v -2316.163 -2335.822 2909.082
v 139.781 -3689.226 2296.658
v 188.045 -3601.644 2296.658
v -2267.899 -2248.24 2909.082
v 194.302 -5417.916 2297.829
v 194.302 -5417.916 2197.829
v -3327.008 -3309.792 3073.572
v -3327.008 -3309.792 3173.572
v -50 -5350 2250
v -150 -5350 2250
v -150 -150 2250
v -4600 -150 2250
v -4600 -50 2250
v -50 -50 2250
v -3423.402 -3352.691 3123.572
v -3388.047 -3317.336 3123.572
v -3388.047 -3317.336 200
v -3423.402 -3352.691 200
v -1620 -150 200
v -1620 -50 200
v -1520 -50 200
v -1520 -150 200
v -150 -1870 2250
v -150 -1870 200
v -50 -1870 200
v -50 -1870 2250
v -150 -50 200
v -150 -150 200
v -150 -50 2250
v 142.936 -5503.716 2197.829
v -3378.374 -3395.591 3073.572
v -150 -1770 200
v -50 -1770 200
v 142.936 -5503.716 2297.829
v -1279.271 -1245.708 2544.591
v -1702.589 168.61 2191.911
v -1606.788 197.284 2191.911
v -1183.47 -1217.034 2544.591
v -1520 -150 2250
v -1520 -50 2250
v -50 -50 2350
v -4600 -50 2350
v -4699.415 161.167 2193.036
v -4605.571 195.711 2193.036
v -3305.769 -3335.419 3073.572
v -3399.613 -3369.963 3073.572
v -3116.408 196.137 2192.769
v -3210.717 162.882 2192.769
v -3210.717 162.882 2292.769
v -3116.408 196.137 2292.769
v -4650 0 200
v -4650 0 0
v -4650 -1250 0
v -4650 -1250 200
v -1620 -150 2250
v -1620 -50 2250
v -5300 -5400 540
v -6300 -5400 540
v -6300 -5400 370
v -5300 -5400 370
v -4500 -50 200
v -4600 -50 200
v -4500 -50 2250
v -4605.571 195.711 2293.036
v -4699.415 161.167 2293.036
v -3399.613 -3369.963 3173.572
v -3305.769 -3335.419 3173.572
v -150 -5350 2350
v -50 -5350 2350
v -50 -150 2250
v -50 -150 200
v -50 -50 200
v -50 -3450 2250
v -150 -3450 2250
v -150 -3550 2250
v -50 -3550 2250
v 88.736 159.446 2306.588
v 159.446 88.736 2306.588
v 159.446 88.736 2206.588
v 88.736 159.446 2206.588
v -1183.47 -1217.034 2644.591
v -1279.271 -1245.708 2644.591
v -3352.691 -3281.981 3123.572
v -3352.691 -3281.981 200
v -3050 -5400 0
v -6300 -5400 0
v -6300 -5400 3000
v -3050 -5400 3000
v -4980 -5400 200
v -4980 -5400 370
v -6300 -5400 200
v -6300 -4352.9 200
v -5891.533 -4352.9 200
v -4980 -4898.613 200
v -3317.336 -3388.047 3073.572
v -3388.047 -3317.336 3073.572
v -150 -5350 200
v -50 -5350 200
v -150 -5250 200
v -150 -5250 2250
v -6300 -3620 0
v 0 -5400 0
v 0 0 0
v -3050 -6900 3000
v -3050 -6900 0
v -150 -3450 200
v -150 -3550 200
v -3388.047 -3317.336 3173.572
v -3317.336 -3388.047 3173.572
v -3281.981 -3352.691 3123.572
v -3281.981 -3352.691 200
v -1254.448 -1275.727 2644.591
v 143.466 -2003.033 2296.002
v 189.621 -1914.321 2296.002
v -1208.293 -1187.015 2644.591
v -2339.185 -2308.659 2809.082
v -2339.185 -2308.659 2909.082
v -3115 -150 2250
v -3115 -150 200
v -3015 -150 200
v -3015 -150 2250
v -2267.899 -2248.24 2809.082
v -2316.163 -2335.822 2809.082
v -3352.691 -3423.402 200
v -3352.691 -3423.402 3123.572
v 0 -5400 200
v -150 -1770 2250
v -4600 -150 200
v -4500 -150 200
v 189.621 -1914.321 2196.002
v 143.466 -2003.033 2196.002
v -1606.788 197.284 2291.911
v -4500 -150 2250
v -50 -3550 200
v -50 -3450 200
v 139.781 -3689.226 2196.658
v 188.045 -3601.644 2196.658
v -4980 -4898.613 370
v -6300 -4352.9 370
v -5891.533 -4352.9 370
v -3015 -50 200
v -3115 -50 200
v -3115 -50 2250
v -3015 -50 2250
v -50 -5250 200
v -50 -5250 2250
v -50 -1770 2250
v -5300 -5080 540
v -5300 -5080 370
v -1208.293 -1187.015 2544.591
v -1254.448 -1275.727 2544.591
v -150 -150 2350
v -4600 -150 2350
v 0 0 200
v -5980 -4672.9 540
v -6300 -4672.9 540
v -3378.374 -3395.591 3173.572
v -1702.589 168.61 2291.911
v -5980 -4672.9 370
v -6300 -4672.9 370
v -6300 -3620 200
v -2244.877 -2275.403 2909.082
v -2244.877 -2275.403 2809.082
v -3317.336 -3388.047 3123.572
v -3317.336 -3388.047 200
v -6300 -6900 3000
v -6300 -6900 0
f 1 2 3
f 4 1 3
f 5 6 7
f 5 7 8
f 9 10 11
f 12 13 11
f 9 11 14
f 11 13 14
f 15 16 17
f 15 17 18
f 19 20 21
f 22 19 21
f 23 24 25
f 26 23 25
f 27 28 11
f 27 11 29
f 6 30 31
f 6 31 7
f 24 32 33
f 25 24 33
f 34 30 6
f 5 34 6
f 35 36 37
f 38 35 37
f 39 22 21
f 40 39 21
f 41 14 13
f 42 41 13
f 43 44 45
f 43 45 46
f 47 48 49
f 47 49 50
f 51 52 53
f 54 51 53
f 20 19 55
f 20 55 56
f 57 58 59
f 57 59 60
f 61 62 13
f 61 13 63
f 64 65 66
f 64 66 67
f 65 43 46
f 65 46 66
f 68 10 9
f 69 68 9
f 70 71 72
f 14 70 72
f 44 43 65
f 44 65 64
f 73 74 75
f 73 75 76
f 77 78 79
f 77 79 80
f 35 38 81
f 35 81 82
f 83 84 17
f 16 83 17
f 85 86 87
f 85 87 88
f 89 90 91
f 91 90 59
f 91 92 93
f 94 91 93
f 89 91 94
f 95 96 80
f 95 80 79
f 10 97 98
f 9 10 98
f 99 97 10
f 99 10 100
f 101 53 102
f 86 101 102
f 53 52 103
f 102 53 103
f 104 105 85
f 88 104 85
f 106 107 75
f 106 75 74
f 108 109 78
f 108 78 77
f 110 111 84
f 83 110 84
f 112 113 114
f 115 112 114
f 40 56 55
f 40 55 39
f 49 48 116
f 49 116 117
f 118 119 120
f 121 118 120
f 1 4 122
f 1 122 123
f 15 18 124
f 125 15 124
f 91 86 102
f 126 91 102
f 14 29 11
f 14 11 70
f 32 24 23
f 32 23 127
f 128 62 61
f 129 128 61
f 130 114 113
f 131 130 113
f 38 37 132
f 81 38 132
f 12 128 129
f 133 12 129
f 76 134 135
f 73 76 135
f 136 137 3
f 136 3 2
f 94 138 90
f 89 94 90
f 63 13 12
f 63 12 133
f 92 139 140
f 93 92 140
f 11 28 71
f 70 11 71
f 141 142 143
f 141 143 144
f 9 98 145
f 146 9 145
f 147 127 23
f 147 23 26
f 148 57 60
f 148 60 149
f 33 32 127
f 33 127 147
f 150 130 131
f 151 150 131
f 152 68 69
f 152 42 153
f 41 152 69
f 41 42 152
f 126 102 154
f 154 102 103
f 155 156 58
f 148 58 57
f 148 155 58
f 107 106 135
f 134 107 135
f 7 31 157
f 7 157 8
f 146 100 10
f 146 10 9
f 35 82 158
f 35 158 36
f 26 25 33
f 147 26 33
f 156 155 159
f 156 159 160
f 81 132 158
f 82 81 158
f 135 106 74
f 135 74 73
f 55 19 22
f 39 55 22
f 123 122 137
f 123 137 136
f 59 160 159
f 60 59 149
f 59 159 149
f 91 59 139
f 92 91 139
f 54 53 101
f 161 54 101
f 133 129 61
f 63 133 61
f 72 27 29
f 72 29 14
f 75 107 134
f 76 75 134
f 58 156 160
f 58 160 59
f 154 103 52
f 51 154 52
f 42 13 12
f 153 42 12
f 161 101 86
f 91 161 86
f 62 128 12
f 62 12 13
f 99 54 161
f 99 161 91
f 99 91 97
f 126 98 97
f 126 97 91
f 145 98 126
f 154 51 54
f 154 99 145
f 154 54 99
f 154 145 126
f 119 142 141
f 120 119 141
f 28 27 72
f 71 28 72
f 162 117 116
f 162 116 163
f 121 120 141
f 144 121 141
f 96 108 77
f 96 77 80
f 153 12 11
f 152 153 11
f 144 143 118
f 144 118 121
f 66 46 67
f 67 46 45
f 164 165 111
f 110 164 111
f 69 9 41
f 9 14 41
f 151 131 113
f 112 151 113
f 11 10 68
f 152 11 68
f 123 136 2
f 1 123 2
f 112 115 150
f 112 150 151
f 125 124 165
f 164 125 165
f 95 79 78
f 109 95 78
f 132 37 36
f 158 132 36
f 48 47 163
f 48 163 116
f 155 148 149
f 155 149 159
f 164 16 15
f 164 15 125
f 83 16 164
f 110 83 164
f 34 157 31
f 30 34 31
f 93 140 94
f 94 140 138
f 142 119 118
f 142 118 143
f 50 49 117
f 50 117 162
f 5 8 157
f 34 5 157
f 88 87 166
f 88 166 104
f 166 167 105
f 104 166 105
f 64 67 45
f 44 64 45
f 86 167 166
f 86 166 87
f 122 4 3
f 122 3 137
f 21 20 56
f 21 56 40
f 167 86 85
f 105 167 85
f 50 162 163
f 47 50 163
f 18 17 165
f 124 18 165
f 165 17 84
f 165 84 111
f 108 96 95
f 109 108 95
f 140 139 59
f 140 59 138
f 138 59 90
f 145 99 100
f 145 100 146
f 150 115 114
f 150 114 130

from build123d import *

# Parameters (mm, degrees)
F1_DEPTH  = 200
F2_W      = 100
F2_H      = 100
F3_DEPTH  = 2050
F5_DEPTH  = 100
F8_W      = 100
F8_H      = 100
F9_DEPTH  = 2050
F10_DEPTH = 1800
F14_W     = 100
F14_H     = 100
F19_W     = 100
F19_H     = 100
F24_W     = 100
F24_H     = 100
F29_W     = 100
F29_H     = 100
F34_W     = 100
F34_H     = 100
F39_W     = 100
F39_H     = 100
F44_W     = 100
F44_H     = 100
F47_DEPTH = 2923.5723116355
F6_W      = 3250
F6_H      = 1500
F48_DEPTH = 3000
F51_DEPTH = 170
F53_DEPTH = 170


with BuildPart() as f1:
    # F0 (on Top) → F1 (new body)
    with BuildSketch(Plane.XY):
        Polygon((0, -5400), (0, 0), (-4650, 0), (-4650, -1250), (-6300, -3620), (-6300, -5400), align=None)
    extrude(amount=F1_DEPTH)

    # F8 (on face) → F9 (join)
    with BuildSketch(Plane.XY.offset(200)):
        with Locations((-100, -5300)):
            Rectangle(F8_W, F8_H)
    extrude(amount=F9_DEPTH)


with BuildPart() as f3:
    # F2 (on face) → F3 (new body)
    with BuildSketch(Plane.XY.offset(200)):
        with Locations((-100, -100)):
            Rectangle(F2_W, F2_H)
    extrude(amount=F3_DEPTH)


with BuildPart() as f3b:
    # F2 (on face) → F3, piece 2 (new body)
    with BuildSketch(Plane.XY.offset(200)):
        with Locations((-100, -1820)):
            Rectangle(F2_W, F2_H)
    extrude(amount=F3_DEPTH)


with BuildPart() as f3c:
    # F2 (on face) → F3, piece 3 (new body)
    with BuildSketch(Plane.XY.offset(200)):
        with Locations((-100, -3500)):
            Rectangle(F2_W, F2_H)
    extrude(amount=F3_DEPTH)


with BuildPart() as f3d:
    # F2 (on face) → F3, piece 4 (new body)
    with BuildSketch(Plane.XY.offset(200)):
        with Locations((-1570, -100)):
            Rectangle(F2_W, F2_H)
    extrude(amount=F3_DEPTH)


with BuildPart() as f3e:
    # F2 (on face) → F3, piece 5 (new body)
    with BuildSketch(Plane.XY.offset(200)):
        with Locations((-4550, -100)):
            Rectangle(F2_W, F2_H)
    extrude(amount=F3_DEPTH)


with BuildPart() as f3f:
    # F2 (on face) → F3, piece 6 (new body)
    with BuildSketch(Plane.XY.offset(200)):
        with Locations((-3065, -100)):
            Rectangle(F2_W, F2_H)
    extrude(amount=F3_DEPTH)


with BuildPart() as f5:
    # F4 (on face) → F5 (new body)
    with BuildSketch(Plane.XY.offset(2250)):
        Polygon((-150, -50), (-4600, -50), (-4600, -150), (-150, -150), (-50, -50), align=None)
        Polygon((-50, -150), (-50, -50), (-150, -150), (-150, -3550), (-50, -3550), align=None)
    extrude(amount=F5_DEPTH)

    # F10 (add, through all): a face of the model
    f10_faces = [f5.faces().sort_by_distance(p)[0] for p in [
        (-100, -3550, 2300),
    ]]
    extrude(f10_faces, amount=F10_DEPTH)


with BuildPart() as f15:
    # F15: sweep along a path in F12
    with BuildLine(Plane(origin=(0, 0, 0), x_dir=(-0.7071067812, -0.7071067812, 0), z_dir=(-0.7071067812, 0.7071067812, 0))) as f15_path:
        Line((4741.4213562373, 3123.5723116355), (-175.4912601344, 2256.5879555833))
    # F14 (on face) → F15 (sweep)
    with BuildSketch(Plane(origin=(-3352.6911934581, -3352.6911934581, 0), x_dir=(0.7071067812, -0.7071067812, 0), z_dir=(-0.7071067812, -0.7071067812, 0))):
        with Locations((0, 3123.5723116355)):
            Rectangle(F14_W, F14_H)
    sweep(path=f15_path.line)


with BuildPart() as f20:
    # F20: sweep along a path in F17
    with BuildLine(Plane(origin=(-2362.1864095052, -3945.6828345314, 0), x_dir=(0.8579936122, -0.5136603562, 0), z_dir=(-0.5136603562, -0.8579936122, 0))) as f20_path:
        Line((-1154.4430750004, 3123.5723116355), (2949.6790376872, 2247.8291507744))
    # F19 (on face) → F20 (sweep)
    with BuildSketch(Plane(origin=(-990.5047839529, 592.9916410733, 0), x_dir=(0.5136603562, 0.8579936122, 0), z_dir=(0.8579936122, -0.5136603562, 0))):
        with Locations((-4598.7321800652, 3123.5723116355)):
            Rectangle(F19_W, F19_H)
    sweep(path=f20_path.line)


with BuildPart() as f25:
    # F25: sweep along a path in F22
    with BuildLine(Plane(origin=(-1502.7624460571, -2726.9755756037, 0), x_dir=(0.8758188091, -0.4826400455, 0), z_dir=(-0.4826400455, -0.8758188091, 0))) as f25_path:
        Line((-901.1779233051, 2859.0818405728), (1902.9906666078, 2246.6579034372))
    # F24 (on face) → F25 (sweep)
    with BuildSketch(Plane(origin=(-789.2685756212, 434.9445539254, 0), x_dir=(-0.4826400455, -0.8758188091, 0), z_dir=(-0.8758188091, 0.4826400455, 0))):
        with Locations((3113.6298365764, 2859.0818405728)):
            Rectangle(F24_W, F24_H)
    sweep(path=f25_path.line)


with BuildPart() as f30:
    # F30: sweep along a path in F27
    with BuildLine(Plane(origin=(-766.4947975737, -1473.2363669454, 0), x_dir=(0.8871152605, -0.4615479548, 0), z_dir=(-0.4615479548, -0.8871152605, 0))) as f30_path:
        Line((-524.03117499, 2594.5913695101), (1051.7669505735, 2246.0017914729))
    # F29 (on face) → F30 (sweep)
    with BuildSketch(Plane(origin=(-464.8760523248, 241.8655170469, 0), x_dir=(-0.4615479548, -0.8871152605, 0), z_dir=(-0.8871152605, 0.4615479548, 0))):
        with Locations((1660.7045696324, 2594.5913695101)):
            Rectangle(F29_W, F29_H)
    sweep(path=f30_path.line)


with BuildPart() as f35:
    # F35: sweep along a path in F32
    with BuildLine(Plane(origin=(-1468.3846024822, -439.5003017846, 0), x_dir=(-0.2867402487, 0.9580083662, 0), z_dir=(0.9580083662, 0.2867402487, 0))) as f35_path:
        Line((-826.579992429, 2594.5913695101), (649.7307515053, 2241.9113541709))
    # F34 (on face) → F35 (sweep)
    with BuildSketch(Plane(origin=(237.0137525837, -791.8705481139, 0), x_dir=(0.9580083662, 0.2867402487, 0), z_dir=(0.2867402487, -0.9580083662, 0))):
        with Locations((-1532.7471598654, 2594.5913695101)):
            Rectangle(F34_W, F34_H)
    sweep(path=f35_path.line)


with BuildPart() as f40:
    # F40: sweep along a path in F37
    with BuildLine(Plane(origin=(-2757.3927763263, -972.3307088586, 0), x_dir=(0.3325564986, -0.9430833342, 0), z_dir=(-0.9430833342, -0.3325564986, 0))) as f40_path:
        Line((1399.346446862, 2859.0818405728), (-1221.3558871335, 2242.7685480654))
    # F39 (on face) → F40 (sweep)
    with BuildSketch(Plane(origin=(465.361754648, -1319.7003128197, 0), x_dir=(-0.9430833342, -0.3325564986, 0), z_dir=(-0.3325564986, 0.9430833342, 0))):
        with Locations((2923.806069206, 2859.0818405728)):
            Rectangle(F39_W, F39_H)
    sweep(path=f40_path.line)


with BuildPart() as f45:
    # F45: sweep along a path in F42
    with BuildLine(Plane(origin=(-4039.4766020219, -1486.9228653332, 0), x_dir=(-0.3454383305, 0.9384414525, 0), z_dir=(0.9384414525, 0.3454383305, 0))) as f45_path:
        Line((-1988.1563448709, 3123.5723116355), (1774.6037001363, 2243.0355831929))
    # F44 (on face) → F45 (sweep)
    with BuildSketch(Plane(origin=(686.7854085638, -1865.768328125, 0), x_dir=(-0.9384414525, -0.3454383305, 0), z_dir=(-0.3454383305, 0.9384414525, 0))):
        with Locations((4304.4524420341, 3123.5723116355)):
            Rectangle(F44_W, F44_H)
    sweep(path=f45_path.line)


with BuildPart() as f47:
    # F46 (on face) → F47 (new body, through all)
    with BuildSketch(Plane.XY.offset(200)):
        Polygon((-3352.6911934581, -3281.9805153395), (-3388.0465325174, -3317.3358543988), (-3317.3358543988, -3388.0465325174), (-3281.9805153395, -3352.6911934581), align=None)
        Polygon((-3317.3358543988, -3388.0465325174), (-3388.0465325174, -3317.3358543988), (-3423.4018715768, -3352.6911934581), (-3352.6911934581, -3423.4018715768), align=None)
    extrude(amount=F47_DEPTH)


with BuildPart() as f48:
    # F6 (on Top) → F48 (new body)
    with BuildSketch(Plane.XY):
        with Locations((-4675, -6150)):
            Rectangle(F6_W, F6_H)
    extrude(amount=F48_DEPTH)


with BuildPart() as f51:
    # F50 (on offset) → F51 (new body)
    with BuildSketch(Plane.XY.offset(540)):
        Polygon((-6300, -4672.9001833584), (-6300, -5400), (-5300, -5400), (-5300, -5080), (-5980, -4672.9001833584), align=None)
    extrude(amount=-F51_DEPTH)


with BuildPart() as f53:
    # F52 (on face) → F53 (new body, through all)
    with BuildSketch(Plane(origin=(0, 0, 370), x_dir=(1, 0, 0), z_dir=(0, 0, -1))):
        Polygon((-4980, 5400), (-6300, 5400), (-6300, 4352.9001833584), (-5891.5328960789, 4352.9001833584), (-4980, 4898.6132346179), align=None)
    extrude(amount=F53_DEPTH)


solid = Compound([f1.part, f3.part, f3b.part, f3c.part, f3d.part, f3e.part, f3f.part, f5.part, f15.part, f20.part, f25.part, f30.part, f35.part, f40.part, f45.part, f47.part, f48.part, f51.part, f53.part])
